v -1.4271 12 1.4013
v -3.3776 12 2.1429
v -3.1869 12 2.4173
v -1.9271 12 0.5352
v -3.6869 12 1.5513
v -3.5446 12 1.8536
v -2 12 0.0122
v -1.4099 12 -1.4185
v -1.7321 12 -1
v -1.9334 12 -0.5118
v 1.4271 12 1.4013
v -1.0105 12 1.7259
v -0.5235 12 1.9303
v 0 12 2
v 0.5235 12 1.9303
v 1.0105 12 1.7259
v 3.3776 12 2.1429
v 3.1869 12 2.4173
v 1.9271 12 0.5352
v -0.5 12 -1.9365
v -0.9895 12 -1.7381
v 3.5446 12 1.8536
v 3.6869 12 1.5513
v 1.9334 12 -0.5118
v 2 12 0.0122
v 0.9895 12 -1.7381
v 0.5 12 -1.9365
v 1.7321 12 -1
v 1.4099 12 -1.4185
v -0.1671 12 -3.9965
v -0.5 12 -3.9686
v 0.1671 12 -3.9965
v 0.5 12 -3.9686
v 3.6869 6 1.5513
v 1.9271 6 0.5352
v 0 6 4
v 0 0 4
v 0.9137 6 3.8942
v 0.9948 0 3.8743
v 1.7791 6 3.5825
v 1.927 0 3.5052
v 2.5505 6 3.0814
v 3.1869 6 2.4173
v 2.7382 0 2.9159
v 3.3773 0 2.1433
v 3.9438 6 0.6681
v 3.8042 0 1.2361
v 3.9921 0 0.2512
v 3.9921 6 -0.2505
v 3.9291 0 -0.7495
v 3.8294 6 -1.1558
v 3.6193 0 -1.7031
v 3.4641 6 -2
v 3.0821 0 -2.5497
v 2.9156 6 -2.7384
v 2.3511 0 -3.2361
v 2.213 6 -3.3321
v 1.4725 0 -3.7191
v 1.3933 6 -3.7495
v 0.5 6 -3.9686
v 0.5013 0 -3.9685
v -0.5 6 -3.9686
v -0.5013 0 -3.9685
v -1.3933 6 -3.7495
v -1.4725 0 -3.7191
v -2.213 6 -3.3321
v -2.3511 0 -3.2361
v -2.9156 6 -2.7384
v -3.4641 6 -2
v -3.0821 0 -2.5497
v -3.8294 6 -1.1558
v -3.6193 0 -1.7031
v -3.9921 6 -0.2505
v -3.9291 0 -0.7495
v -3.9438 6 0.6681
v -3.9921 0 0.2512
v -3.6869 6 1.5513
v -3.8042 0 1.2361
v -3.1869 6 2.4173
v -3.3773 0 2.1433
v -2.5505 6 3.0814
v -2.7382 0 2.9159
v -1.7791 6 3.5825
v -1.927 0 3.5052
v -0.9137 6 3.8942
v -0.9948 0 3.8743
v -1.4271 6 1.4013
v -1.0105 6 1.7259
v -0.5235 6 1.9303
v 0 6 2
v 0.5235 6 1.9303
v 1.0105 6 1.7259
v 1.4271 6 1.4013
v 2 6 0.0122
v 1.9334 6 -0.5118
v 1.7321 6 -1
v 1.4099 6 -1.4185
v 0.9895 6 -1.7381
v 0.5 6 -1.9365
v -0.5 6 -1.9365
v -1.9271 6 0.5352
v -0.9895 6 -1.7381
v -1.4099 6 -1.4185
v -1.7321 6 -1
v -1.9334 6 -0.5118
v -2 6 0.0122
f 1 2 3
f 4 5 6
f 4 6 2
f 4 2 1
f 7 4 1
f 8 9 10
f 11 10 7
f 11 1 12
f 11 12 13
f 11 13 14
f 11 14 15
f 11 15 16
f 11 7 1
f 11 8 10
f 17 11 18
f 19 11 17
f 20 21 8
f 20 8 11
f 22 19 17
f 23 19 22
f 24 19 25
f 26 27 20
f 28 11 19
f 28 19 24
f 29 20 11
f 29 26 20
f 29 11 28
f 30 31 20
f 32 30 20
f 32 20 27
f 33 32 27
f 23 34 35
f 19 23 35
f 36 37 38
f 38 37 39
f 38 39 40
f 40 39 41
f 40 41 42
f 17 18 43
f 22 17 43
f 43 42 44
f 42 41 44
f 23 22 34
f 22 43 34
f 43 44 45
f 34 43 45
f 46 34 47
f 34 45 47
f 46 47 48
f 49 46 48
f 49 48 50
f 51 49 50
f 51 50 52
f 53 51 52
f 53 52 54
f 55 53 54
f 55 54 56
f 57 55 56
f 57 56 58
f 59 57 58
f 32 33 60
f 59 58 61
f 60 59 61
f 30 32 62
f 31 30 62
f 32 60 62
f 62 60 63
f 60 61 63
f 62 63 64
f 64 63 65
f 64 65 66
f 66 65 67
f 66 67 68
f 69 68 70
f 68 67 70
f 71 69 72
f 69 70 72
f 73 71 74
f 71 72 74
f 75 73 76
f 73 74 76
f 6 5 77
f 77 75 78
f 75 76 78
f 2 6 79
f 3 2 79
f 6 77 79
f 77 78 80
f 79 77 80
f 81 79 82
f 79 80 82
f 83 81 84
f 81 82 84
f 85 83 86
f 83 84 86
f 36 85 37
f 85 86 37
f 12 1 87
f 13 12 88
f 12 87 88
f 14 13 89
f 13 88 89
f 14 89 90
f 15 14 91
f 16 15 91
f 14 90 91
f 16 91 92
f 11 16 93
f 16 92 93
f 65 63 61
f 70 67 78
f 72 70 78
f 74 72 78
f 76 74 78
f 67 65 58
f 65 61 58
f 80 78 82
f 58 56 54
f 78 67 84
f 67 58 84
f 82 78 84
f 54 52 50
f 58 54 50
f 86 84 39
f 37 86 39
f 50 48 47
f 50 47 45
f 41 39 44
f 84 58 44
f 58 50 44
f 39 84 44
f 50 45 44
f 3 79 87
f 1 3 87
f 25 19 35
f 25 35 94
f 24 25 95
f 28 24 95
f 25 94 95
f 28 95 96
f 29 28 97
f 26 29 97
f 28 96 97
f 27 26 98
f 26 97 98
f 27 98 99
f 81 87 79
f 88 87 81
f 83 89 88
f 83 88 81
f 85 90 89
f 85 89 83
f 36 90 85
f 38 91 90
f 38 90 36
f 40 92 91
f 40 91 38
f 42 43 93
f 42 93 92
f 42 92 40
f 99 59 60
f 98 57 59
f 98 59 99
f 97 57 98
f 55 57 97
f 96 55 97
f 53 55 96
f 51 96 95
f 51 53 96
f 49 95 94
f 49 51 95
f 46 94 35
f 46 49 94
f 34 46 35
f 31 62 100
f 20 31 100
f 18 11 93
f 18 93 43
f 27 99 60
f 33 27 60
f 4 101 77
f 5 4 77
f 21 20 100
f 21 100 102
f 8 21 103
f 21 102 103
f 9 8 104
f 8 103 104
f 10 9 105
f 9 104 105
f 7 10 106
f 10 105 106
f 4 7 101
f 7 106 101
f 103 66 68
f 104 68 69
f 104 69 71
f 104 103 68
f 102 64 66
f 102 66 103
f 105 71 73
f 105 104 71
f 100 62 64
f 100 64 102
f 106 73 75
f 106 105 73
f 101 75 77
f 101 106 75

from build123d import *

# Parameters (mm, degrees)
SKETCH1_R           = 4
BOSS_EXTRUDE1_DEPTH = 6
SKETCH2_R           = 2
BOSS_EXTRUDE2_DEPTH = 6
BOSS_EXTRUDE3_DEPTH = 6


with BuildPart() as part:
    # Sketch1 → Boss-Extrude1 (new body)
    with BuildSketch(Plane(origin=(0, 0, 0), x_dir=(1, 0, 0), z_dir=(0, 1, 0))):
        with Locations(Location((0, 0, 0), (0, 0, 270))):
            Circle(SKETCH1_R)
    extrude(amount=BOSS_EXTRUDE1_DEPTH)

    # Sketch2 → Boss-Extrude2 (add)
    with BuildSketch(Plane(origin=(0, 6, 0), x_dir=(1, 0, 0), z_dir=(0, 1, 0))):
        with Locations(Location((0, 0, 0), (0, 0, 270))):
            Circle(SKETCH2_R)
    extrude(amount=BOSS_EXTRUDE2_DEPTH)

    # Sketch3 → Boss-Extrude3 (add)
    with BuildSketch(Plane(origin=(0, 6, 0), x_dir=(1, 0, 0), z_dir=(0, 1, 0))):
        with BuildLine():
            Line((-0.500000000000001, 3.968626966596886), (-0.5, 0.28867513459480454))
            Line((-0.5, 0.28867513459480454), (-3.6869317712168805, -1.551300781406223))
            ThreePointArc((-3.6869317712168805, -1.551300781406223), (-3.4641016151377557, -1.9999999999999982), (-3.186931771216881, -2.4173261851906616))
            Line((-3.186931771216881, -2.4173261851906616), (2.344e-14, -0.5773502691896194))
            Line((2.344e-14, -0.5773502691896194), (3.186931771216881, -2.4173261851906616))
            ThreePointArc((3.186931771216881, -2.4173261851906616), (3.4641016151377553, -1.9999999999999991), (3.6869317712168805, -1.551300781406223))
            Line((3.6869317712168805, -1.551300781406223), (0.5000000000000009, 0.28867513459480254))
            Line((0.5000000000000009, 0.28867513459480254), (0.49999999999999895, 3.968626966596886))
            ThreePointArc((0.49999999999999895, 3.968626966596886), (-1.53e-15, 4), (-0.500000000000001, 3.968626966596886))
        make_face()
    extrude(amount=BOSS_EXTRUDE3_DEPTH)


solid = part.part
